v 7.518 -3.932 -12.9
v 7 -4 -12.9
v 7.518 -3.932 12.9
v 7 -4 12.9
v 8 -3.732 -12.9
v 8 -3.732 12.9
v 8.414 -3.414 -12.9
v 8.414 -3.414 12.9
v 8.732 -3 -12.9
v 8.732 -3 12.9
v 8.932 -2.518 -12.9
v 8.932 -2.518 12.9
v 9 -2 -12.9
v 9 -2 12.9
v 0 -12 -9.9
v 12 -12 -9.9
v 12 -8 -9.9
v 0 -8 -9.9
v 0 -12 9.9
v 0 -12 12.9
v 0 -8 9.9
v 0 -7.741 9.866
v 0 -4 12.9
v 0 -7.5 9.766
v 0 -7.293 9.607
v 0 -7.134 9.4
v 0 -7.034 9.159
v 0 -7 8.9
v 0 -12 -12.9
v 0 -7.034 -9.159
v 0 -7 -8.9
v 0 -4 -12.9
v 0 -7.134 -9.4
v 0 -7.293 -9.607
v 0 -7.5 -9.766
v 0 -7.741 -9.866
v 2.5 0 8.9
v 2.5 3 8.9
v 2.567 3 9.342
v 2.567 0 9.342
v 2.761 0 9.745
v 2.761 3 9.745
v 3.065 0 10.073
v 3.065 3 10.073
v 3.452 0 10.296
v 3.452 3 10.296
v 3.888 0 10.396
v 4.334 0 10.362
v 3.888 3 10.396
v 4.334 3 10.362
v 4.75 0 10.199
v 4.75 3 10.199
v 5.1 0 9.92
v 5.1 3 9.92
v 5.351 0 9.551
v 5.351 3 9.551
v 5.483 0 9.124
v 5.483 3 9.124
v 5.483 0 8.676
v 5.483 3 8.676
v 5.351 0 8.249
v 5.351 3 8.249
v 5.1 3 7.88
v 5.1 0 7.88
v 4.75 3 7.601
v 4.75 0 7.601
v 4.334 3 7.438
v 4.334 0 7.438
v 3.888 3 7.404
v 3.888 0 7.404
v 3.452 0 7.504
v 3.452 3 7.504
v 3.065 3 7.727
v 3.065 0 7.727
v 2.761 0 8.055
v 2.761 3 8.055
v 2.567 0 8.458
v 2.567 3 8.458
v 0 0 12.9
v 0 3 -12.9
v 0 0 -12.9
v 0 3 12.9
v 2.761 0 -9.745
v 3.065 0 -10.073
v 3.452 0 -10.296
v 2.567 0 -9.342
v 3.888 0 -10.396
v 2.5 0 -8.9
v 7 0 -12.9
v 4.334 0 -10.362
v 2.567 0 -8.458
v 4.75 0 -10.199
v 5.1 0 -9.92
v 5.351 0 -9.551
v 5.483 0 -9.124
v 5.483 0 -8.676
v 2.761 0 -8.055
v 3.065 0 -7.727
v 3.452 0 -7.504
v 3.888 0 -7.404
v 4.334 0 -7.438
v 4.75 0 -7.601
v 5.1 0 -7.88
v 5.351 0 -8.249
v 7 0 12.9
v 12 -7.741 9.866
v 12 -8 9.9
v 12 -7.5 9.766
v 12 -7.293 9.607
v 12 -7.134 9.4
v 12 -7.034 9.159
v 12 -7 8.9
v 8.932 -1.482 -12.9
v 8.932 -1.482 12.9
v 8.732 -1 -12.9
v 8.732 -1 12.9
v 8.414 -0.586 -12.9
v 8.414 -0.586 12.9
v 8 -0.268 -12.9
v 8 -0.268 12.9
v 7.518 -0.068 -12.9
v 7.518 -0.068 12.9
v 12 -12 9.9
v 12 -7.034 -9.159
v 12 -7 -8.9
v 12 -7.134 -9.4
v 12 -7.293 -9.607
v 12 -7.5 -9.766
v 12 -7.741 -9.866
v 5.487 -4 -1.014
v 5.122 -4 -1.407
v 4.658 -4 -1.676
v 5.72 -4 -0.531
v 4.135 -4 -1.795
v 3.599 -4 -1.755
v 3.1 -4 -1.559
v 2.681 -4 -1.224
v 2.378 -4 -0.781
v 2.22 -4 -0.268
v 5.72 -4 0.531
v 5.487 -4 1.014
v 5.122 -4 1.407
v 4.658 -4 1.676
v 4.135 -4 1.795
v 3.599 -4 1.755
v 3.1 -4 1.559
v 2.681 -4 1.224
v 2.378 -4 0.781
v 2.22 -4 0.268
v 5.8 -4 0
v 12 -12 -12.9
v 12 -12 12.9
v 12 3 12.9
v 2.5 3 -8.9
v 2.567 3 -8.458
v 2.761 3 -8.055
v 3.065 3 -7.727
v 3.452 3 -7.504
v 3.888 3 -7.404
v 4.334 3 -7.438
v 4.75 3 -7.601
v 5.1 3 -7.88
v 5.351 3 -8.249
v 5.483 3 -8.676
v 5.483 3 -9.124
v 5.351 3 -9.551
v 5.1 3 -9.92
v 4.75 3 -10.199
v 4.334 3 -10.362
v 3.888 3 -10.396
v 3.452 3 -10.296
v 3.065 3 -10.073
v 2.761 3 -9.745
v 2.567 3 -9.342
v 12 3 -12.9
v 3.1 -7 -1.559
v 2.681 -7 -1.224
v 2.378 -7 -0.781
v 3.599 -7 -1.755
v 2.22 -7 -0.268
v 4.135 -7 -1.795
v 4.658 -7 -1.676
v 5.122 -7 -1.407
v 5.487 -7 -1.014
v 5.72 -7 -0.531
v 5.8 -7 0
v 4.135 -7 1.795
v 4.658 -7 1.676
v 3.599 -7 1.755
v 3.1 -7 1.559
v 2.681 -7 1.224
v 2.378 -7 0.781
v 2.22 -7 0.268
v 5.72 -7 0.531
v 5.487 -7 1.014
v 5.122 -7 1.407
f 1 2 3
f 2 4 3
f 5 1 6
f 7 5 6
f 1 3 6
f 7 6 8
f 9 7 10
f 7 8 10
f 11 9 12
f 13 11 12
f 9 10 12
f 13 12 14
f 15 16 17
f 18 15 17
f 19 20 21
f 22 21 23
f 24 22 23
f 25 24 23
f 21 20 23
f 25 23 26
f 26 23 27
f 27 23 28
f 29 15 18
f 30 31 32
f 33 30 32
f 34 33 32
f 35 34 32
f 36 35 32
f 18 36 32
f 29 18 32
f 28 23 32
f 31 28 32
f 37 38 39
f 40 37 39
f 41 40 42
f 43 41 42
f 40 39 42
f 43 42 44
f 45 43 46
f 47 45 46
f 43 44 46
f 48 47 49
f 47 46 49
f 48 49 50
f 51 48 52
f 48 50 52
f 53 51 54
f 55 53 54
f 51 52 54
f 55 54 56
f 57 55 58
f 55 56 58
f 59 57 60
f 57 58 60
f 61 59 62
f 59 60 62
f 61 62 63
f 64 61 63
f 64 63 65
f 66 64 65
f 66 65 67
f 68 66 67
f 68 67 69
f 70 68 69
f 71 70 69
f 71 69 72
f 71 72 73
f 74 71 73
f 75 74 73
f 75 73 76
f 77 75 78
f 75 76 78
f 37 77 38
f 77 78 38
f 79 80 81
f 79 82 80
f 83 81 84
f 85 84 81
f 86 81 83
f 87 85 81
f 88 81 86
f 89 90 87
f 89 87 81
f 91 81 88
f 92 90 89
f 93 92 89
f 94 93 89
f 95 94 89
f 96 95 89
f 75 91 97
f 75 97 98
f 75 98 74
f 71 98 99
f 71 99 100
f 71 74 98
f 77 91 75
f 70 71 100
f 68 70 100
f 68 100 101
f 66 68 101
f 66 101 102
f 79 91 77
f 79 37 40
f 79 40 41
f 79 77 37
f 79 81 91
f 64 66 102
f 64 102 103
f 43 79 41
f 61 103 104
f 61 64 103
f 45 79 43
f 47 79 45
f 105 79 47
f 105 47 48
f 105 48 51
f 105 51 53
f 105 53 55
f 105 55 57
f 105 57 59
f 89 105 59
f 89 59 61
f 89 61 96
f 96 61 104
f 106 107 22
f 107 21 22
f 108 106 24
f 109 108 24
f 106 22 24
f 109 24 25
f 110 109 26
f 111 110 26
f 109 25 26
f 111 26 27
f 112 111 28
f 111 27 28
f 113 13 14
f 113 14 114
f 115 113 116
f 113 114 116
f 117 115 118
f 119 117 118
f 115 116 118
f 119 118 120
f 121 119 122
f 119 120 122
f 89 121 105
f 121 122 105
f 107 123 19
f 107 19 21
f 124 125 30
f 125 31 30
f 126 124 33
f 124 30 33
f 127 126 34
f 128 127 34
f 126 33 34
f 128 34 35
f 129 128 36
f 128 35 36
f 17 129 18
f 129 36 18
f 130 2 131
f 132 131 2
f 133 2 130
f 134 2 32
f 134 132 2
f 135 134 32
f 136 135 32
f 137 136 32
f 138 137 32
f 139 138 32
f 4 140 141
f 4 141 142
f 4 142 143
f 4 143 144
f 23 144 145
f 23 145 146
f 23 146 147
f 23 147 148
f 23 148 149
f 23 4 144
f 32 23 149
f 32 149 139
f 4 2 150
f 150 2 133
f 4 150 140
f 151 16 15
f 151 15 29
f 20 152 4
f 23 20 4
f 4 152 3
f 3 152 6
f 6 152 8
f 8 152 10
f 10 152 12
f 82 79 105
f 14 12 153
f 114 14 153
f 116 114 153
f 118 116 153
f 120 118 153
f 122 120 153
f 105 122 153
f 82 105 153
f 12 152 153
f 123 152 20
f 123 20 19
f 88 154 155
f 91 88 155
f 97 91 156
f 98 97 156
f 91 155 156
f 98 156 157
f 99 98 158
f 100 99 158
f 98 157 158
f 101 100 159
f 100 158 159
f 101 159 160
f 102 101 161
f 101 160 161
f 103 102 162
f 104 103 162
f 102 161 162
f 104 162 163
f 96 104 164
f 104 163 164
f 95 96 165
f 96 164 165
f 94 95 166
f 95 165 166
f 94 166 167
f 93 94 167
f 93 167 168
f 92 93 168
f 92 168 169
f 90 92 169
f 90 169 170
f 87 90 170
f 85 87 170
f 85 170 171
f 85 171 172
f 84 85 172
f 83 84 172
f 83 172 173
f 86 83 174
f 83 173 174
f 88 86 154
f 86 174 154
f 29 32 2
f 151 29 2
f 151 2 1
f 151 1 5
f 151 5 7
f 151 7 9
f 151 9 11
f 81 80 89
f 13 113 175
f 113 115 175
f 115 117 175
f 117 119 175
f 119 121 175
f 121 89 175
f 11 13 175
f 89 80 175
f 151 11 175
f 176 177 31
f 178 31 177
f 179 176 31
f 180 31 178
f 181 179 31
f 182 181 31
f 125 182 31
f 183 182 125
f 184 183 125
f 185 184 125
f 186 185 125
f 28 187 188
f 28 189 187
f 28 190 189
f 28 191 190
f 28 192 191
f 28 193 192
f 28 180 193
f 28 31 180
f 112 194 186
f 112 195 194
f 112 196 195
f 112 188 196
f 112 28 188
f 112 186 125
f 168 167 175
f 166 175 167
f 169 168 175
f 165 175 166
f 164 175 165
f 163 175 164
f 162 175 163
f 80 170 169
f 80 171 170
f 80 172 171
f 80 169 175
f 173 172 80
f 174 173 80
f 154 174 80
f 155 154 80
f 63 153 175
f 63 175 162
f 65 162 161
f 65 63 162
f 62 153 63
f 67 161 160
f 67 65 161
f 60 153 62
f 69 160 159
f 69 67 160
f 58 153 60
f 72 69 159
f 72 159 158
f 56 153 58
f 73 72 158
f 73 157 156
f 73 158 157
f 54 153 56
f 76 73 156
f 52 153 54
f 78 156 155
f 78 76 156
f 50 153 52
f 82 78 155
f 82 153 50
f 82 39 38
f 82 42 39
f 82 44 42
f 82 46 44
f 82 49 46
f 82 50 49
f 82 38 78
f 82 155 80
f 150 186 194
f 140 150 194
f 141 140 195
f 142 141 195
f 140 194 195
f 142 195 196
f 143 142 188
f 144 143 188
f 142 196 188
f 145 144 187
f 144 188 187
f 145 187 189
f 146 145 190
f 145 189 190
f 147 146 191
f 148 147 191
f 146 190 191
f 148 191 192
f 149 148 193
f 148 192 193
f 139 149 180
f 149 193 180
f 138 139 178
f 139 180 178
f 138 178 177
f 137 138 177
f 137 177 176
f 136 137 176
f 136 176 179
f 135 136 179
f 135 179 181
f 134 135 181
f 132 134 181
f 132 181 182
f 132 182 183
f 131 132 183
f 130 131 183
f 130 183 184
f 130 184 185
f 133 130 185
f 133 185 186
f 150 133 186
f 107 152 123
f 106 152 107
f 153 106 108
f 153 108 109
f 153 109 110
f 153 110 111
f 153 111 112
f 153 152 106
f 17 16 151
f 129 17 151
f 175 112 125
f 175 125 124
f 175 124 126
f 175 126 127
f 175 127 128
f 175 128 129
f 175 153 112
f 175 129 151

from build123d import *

# Parameters (mm, degrees)
BOSS_EXTRUDE1_DEPTH = 12.9
SKETCH2_W           = 3
SKETCH2_H           = 5
BOSS_EXTRUDE2_DEPTH = 12
SKETCH3_R           = 1.8
CUT_EXTRUDE1_DEPTH  = 5
FILLET1_R           = 2
FILLET2_R           = 1
SKETCH4_R           = 1.5
CUT_EXTRUDE2_DEPTH  = 3


with BuildPart() as part:
    # Sketch1 → Boss-Extrude1 (new, symmetric)
    with BuildSketch(Plane.XY):
        Polygon((0, 0), (9, 0), (9, -4), (0, -4), (0, -7), (12, -7), (12, 3), (0, 3), align=None)
    extrude(amount=BOSS_EXTRUDE1_DEPTH, both=True)

    # Sketch2 → Boss-Extrude2 (add, through all)
    with BuildSketch(Plane(origin=(12, 0, 0), x_dir=(0, 0, -1), z_dir=(1, 0, 0))):
        with Locations((-11.4, -9.5)):
            Rectangle(SKETCH2_W, SKETCH2_H)
        with Locations((11.4, -9.5)):
            Rectangle(SKETCH2_W, SKETCH2_H)
    extrude(amount=-BOSS_EXTRUDE2_DEPTH)

    # Sketch3 → Cut-Extrude1 (cut)
    with BuildSketch(Plane.XZ.offset(7)):
        with Locations((4, 0)):
            Circle(SKETCH3_R)
    extrude(amount=-CUT_EXTRUDE1_DEPTH, mode=Mode.SUBTRACT)

    # Fillet1
    fillet1_edges = [part.edges().sort_by_distance(p)[0] for p in [
        (9, -4, 0),
        (9, 0, 0),
    ]]
    fillet(fillet1_edges, radius=FILLET1_R - 0.0001)  # a hair under: the kernel refuses the full size

    # Fillet2
    fillet2_edges = [part.edges().sort_by_distance(p)[0] for p in [
        (6, -7, 9.9),
        (6, -7, -9.9),
    ]]
    fillet(fillet2_edges, radius=FILLET2_R)

    # Sketch4 → Cut-Extrude2 (cut)
    with BuildSketch(Plane(origin=(0, 3, 0), x_dir=(1, 0, 0), z_dir=(0, 1, 0))):
        with Locations(Location((4, 8.9, 0), (0, 0, 180))):
            Circle(SKETCH4_R)
        with Locations(Location((4, -8.9, 0), (0, 0, 180))):
            Circle(SKETCH4_R)
    extrude(amount=-CUT_EXTRUDE2_DEPTH, mode=Mode.SUBTRACT)


solid = part.part
